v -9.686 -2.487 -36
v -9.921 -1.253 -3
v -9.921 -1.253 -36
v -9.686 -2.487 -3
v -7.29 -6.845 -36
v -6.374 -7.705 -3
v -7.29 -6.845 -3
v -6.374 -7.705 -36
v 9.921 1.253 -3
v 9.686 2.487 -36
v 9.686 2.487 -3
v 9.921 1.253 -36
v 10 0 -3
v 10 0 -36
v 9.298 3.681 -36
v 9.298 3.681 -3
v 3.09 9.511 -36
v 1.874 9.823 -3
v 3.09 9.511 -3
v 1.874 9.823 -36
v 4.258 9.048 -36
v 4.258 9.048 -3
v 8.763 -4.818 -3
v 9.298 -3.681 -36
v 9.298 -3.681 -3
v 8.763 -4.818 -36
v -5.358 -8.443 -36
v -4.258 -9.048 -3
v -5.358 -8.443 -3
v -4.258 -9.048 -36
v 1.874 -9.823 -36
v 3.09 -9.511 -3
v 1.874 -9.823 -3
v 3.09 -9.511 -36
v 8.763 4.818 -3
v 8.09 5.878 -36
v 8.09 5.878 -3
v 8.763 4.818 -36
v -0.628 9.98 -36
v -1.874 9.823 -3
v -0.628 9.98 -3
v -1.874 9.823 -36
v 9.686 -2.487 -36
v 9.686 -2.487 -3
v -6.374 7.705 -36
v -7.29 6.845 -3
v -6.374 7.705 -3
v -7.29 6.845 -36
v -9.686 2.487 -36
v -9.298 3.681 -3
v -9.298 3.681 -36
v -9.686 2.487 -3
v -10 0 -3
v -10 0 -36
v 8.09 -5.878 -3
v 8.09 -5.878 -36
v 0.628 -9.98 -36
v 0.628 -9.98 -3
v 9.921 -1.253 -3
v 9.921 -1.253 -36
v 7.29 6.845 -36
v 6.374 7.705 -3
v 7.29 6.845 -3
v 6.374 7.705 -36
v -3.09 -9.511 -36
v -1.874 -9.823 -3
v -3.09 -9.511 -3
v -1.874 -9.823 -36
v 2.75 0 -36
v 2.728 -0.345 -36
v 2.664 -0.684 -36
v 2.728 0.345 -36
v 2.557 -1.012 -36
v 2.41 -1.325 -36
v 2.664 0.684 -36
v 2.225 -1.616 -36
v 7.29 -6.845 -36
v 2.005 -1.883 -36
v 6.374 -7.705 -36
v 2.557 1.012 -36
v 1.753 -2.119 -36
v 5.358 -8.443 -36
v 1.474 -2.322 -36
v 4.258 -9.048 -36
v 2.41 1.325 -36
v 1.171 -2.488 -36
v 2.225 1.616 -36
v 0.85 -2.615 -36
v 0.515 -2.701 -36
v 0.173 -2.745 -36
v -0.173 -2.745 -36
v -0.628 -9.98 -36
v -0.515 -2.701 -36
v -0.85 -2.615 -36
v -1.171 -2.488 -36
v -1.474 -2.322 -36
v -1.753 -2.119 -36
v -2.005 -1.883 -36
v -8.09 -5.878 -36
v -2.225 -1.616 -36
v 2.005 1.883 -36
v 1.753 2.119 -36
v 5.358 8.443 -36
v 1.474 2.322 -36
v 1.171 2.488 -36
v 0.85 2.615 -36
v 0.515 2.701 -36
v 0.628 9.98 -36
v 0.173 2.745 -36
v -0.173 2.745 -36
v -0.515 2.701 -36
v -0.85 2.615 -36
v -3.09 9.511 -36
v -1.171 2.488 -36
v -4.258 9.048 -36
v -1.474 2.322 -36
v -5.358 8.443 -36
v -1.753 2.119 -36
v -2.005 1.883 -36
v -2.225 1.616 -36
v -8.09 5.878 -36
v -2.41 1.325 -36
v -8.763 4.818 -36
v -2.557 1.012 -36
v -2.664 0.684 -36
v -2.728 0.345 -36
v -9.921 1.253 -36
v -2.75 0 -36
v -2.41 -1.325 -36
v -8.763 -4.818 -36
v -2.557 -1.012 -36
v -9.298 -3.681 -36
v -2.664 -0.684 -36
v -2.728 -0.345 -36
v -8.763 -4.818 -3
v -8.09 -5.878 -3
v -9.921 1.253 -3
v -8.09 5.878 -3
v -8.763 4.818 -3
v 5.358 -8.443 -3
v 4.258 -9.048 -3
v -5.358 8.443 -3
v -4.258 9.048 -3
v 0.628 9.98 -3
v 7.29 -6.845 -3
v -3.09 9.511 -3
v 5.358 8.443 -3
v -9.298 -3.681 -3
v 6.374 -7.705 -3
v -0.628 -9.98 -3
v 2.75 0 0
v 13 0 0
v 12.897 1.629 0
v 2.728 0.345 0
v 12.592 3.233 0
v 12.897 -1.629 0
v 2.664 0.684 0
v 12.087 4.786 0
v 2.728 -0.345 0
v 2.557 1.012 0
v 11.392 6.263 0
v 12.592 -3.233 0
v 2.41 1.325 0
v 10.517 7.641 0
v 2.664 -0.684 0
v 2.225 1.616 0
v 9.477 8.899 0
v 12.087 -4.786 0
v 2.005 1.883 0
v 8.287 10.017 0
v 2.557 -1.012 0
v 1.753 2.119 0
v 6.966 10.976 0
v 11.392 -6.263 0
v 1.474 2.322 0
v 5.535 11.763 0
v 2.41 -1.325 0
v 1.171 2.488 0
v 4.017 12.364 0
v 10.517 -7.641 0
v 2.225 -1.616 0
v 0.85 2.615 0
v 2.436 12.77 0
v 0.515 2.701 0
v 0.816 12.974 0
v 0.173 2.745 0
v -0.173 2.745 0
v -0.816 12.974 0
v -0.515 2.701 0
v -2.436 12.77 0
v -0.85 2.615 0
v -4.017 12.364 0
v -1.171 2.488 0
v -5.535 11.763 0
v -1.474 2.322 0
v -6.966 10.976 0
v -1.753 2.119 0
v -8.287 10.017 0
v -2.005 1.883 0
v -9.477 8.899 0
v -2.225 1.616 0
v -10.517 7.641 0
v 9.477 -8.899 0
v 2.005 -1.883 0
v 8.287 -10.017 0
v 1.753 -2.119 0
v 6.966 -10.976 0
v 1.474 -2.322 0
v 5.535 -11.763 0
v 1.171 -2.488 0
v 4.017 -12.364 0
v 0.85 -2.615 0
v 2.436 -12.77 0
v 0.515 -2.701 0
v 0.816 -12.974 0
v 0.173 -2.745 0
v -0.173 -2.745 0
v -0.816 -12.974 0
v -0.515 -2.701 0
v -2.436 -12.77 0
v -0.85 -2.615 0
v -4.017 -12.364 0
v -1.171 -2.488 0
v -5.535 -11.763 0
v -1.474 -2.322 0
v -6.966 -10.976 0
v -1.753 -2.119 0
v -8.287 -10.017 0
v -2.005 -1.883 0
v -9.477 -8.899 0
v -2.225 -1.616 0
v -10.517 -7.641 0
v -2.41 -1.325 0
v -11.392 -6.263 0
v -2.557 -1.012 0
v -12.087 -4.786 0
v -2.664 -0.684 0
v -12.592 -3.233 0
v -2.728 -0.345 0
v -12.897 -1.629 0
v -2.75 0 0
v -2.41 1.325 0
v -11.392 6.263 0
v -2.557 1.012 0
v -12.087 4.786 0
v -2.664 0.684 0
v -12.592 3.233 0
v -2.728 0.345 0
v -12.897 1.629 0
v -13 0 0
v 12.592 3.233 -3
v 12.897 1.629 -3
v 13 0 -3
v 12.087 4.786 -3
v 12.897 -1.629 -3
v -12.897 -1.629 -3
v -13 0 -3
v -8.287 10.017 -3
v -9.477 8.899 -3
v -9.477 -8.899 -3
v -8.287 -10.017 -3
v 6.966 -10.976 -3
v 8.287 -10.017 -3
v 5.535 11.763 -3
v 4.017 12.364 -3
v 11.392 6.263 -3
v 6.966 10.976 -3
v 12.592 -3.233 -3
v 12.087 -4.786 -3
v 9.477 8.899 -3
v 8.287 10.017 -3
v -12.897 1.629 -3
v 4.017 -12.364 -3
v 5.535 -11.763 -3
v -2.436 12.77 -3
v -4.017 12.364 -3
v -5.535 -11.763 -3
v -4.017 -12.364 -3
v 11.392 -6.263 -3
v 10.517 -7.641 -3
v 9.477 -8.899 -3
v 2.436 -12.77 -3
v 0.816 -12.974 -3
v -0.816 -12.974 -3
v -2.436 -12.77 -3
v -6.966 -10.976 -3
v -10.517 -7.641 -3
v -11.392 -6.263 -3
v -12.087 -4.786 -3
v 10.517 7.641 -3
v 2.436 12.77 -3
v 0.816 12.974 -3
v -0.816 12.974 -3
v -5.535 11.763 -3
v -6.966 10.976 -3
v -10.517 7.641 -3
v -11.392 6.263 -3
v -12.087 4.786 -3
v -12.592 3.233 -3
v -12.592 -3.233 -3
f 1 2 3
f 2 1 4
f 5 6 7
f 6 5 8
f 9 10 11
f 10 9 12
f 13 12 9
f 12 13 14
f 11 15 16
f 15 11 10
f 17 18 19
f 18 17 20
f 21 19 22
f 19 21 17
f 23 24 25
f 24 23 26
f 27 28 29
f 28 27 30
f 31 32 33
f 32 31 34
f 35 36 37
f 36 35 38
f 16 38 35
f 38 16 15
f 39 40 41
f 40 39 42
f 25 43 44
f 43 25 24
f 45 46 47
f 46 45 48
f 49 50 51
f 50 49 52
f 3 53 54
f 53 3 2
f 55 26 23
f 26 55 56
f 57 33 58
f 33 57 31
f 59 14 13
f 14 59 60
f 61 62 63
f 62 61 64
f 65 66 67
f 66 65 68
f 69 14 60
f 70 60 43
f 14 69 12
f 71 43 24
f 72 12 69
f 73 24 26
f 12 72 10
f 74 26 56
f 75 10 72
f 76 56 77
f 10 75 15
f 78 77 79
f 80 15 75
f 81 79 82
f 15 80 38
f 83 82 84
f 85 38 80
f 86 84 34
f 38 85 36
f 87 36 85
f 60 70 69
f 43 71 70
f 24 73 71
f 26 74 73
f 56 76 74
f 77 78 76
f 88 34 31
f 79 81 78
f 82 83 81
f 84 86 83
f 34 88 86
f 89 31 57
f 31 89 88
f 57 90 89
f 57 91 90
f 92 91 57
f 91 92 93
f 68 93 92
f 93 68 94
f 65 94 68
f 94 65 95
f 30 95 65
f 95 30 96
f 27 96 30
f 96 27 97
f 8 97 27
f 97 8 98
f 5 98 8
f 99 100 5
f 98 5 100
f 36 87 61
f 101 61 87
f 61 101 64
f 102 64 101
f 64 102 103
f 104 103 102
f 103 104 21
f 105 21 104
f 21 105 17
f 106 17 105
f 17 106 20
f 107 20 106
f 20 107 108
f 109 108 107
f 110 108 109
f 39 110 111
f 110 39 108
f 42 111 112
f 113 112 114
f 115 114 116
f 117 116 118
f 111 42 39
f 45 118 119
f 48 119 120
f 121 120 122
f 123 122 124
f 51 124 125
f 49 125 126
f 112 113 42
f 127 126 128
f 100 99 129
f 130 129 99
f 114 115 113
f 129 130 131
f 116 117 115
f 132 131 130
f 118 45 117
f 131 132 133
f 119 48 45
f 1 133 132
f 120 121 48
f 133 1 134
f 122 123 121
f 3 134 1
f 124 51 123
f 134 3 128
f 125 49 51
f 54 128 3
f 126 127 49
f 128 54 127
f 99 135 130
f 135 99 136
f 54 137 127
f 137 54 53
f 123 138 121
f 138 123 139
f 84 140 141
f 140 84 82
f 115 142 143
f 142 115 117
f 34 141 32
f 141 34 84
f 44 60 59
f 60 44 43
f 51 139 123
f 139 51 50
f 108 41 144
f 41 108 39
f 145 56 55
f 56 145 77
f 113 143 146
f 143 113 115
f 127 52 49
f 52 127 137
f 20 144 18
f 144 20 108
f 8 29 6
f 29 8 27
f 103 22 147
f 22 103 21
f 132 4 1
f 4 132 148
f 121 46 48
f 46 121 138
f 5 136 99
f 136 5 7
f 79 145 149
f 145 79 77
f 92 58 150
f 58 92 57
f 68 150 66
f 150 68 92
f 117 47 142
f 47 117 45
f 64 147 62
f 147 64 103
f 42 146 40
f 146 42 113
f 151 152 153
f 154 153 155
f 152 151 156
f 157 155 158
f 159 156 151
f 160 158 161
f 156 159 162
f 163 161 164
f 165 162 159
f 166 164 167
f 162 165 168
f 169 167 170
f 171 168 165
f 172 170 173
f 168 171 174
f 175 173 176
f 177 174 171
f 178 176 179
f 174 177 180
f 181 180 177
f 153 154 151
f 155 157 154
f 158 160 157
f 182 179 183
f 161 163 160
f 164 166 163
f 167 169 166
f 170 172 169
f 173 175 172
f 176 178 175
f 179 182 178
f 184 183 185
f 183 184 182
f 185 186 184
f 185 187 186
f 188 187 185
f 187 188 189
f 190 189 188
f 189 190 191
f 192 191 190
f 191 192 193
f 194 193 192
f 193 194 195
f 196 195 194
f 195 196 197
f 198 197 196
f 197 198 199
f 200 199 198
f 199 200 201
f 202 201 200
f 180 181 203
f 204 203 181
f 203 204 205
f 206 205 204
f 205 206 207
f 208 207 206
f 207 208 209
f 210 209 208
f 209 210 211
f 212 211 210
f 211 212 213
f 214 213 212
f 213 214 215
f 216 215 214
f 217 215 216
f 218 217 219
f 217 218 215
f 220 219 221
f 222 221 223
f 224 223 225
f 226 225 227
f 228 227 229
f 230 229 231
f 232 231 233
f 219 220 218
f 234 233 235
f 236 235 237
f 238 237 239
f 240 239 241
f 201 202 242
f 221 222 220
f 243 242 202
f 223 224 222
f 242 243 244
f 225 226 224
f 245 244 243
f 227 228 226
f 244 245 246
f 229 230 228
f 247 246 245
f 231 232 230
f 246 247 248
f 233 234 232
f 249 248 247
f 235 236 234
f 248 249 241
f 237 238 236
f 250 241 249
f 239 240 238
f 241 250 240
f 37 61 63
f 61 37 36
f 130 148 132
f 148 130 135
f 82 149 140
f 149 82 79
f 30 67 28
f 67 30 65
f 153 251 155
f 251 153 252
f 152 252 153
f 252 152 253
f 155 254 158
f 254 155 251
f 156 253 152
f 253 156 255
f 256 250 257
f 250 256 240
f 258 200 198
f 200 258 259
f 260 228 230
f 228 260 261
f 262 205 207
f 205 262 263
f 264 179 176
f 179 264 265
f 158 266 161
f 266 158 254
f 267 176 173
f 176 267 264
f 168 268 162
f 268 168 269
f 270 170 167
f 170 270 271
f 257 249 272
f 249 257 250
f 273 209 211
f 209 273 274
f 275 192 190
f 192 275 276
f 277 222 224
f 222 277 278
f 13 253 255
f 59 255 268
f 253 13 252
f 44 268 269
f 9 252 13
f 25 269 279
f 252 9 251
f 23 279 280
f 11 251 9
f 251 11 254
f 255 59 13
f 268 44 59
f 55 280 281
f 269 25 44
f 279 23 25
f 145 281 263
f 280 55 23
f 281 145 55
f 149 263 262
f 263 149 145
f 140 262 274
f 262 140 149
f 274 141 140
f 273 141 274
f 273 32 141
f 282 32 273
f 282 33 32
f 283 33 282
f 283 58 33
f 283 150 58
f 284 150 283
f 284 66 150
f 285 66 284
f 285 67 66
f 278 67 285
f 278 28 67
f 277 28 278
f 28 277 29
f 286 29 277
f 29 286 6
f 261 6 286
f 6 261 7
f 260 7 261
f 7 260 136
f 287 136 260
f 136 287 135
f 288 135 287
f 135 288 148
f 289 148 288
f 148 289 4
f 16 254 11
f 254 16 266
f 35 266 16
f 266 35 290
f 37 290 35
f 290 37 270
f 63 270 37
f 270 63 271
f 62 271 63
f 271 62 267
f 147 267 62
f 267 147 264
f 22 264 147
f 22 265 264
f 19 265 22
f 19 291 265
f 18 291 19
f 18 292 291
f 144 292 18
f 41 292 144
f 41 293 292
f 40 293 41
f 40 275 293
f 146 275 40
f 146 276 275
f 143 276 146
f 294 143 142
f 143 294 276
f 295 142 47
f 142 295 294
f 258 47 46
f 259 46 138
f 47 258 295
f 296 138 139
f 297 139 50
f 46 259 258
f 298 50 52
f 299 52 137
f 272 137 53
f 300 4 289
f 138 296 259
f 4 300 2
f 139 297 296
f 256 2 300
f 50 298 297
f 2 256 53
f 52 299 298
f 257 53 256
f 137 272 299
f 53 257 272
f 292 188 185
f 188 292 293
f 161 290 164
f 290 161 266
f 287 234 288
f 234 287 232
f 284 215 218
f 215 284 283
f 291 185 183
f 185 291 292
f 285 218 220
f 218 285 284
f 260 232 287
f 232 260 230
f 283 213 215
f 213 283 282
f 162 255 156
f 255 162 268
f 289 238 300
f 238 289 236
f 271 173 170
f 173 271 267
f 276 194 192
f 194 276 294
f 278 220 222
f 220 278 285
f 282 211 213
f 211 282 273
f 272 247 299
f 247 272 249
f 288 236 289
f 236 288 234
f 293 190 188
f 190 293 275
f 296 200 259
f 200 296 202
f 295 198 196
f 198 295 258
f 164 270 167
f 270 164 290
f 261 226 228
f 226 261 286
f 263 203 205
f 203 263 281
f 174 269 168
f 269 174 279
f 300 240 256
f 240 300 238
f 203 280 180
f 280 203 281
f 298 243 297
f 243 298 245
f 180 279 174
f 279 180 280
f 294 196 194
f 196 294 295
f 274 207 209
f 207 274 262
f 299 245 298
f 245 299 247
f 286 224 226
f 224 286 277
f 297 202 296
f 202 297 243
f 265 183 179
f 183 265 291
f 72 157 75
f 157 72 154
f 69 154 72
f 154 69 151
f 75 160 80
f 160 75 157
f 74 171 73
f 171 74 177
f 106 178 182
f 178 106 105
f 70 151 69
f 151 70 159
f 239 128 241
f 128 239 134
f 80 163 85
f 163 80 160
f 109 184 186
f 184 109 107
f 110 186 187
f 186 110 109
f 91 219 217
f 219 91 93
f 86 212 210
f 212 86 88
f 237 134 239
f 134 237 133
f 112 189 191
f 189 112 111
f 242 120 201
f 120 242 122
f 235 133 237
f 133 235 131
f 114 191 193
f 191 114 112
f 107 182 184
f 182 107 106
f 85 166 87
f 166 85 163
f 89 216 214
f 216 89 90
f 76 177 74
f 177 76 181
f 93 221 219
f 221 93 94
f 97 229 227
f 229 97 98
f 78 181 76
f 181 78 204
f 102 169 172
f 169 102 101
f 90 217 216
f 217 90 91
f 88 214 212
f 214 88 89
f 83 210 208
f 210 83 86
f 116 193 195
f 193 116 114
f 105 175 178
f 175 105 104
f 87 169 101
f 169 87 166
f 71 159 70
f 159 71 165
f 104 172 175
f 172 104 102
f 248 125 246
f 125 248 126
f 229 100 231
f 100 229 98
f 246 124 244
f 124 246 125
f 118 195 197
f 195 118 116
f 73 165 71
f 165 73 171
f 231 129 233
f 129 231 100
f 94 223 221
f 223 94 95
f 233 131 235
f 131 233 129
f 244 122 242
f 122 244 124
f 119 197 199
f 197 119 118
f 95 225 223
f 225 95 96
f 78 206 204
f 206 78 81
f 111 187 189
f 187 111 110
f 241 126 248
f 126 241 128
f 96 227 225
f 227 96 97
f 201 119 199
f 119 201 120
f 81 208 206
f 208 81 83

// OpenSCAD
$fn = 50;


difference() {
	union() {
		translate(v = [0, 0, -36.0000000000]) {
			cylinder(h = 36, r = 10.0000000000);
		}
		translate(v = [0, 0, -3.0000000000]) {
			cylinder(h = 3, r = 13.0000000000);
		}
	}
	union() {
		#translate(v = [0, 0, -36]) {
			cylinder(h = 36, r = 2.7500000000);
		}
	}
}
